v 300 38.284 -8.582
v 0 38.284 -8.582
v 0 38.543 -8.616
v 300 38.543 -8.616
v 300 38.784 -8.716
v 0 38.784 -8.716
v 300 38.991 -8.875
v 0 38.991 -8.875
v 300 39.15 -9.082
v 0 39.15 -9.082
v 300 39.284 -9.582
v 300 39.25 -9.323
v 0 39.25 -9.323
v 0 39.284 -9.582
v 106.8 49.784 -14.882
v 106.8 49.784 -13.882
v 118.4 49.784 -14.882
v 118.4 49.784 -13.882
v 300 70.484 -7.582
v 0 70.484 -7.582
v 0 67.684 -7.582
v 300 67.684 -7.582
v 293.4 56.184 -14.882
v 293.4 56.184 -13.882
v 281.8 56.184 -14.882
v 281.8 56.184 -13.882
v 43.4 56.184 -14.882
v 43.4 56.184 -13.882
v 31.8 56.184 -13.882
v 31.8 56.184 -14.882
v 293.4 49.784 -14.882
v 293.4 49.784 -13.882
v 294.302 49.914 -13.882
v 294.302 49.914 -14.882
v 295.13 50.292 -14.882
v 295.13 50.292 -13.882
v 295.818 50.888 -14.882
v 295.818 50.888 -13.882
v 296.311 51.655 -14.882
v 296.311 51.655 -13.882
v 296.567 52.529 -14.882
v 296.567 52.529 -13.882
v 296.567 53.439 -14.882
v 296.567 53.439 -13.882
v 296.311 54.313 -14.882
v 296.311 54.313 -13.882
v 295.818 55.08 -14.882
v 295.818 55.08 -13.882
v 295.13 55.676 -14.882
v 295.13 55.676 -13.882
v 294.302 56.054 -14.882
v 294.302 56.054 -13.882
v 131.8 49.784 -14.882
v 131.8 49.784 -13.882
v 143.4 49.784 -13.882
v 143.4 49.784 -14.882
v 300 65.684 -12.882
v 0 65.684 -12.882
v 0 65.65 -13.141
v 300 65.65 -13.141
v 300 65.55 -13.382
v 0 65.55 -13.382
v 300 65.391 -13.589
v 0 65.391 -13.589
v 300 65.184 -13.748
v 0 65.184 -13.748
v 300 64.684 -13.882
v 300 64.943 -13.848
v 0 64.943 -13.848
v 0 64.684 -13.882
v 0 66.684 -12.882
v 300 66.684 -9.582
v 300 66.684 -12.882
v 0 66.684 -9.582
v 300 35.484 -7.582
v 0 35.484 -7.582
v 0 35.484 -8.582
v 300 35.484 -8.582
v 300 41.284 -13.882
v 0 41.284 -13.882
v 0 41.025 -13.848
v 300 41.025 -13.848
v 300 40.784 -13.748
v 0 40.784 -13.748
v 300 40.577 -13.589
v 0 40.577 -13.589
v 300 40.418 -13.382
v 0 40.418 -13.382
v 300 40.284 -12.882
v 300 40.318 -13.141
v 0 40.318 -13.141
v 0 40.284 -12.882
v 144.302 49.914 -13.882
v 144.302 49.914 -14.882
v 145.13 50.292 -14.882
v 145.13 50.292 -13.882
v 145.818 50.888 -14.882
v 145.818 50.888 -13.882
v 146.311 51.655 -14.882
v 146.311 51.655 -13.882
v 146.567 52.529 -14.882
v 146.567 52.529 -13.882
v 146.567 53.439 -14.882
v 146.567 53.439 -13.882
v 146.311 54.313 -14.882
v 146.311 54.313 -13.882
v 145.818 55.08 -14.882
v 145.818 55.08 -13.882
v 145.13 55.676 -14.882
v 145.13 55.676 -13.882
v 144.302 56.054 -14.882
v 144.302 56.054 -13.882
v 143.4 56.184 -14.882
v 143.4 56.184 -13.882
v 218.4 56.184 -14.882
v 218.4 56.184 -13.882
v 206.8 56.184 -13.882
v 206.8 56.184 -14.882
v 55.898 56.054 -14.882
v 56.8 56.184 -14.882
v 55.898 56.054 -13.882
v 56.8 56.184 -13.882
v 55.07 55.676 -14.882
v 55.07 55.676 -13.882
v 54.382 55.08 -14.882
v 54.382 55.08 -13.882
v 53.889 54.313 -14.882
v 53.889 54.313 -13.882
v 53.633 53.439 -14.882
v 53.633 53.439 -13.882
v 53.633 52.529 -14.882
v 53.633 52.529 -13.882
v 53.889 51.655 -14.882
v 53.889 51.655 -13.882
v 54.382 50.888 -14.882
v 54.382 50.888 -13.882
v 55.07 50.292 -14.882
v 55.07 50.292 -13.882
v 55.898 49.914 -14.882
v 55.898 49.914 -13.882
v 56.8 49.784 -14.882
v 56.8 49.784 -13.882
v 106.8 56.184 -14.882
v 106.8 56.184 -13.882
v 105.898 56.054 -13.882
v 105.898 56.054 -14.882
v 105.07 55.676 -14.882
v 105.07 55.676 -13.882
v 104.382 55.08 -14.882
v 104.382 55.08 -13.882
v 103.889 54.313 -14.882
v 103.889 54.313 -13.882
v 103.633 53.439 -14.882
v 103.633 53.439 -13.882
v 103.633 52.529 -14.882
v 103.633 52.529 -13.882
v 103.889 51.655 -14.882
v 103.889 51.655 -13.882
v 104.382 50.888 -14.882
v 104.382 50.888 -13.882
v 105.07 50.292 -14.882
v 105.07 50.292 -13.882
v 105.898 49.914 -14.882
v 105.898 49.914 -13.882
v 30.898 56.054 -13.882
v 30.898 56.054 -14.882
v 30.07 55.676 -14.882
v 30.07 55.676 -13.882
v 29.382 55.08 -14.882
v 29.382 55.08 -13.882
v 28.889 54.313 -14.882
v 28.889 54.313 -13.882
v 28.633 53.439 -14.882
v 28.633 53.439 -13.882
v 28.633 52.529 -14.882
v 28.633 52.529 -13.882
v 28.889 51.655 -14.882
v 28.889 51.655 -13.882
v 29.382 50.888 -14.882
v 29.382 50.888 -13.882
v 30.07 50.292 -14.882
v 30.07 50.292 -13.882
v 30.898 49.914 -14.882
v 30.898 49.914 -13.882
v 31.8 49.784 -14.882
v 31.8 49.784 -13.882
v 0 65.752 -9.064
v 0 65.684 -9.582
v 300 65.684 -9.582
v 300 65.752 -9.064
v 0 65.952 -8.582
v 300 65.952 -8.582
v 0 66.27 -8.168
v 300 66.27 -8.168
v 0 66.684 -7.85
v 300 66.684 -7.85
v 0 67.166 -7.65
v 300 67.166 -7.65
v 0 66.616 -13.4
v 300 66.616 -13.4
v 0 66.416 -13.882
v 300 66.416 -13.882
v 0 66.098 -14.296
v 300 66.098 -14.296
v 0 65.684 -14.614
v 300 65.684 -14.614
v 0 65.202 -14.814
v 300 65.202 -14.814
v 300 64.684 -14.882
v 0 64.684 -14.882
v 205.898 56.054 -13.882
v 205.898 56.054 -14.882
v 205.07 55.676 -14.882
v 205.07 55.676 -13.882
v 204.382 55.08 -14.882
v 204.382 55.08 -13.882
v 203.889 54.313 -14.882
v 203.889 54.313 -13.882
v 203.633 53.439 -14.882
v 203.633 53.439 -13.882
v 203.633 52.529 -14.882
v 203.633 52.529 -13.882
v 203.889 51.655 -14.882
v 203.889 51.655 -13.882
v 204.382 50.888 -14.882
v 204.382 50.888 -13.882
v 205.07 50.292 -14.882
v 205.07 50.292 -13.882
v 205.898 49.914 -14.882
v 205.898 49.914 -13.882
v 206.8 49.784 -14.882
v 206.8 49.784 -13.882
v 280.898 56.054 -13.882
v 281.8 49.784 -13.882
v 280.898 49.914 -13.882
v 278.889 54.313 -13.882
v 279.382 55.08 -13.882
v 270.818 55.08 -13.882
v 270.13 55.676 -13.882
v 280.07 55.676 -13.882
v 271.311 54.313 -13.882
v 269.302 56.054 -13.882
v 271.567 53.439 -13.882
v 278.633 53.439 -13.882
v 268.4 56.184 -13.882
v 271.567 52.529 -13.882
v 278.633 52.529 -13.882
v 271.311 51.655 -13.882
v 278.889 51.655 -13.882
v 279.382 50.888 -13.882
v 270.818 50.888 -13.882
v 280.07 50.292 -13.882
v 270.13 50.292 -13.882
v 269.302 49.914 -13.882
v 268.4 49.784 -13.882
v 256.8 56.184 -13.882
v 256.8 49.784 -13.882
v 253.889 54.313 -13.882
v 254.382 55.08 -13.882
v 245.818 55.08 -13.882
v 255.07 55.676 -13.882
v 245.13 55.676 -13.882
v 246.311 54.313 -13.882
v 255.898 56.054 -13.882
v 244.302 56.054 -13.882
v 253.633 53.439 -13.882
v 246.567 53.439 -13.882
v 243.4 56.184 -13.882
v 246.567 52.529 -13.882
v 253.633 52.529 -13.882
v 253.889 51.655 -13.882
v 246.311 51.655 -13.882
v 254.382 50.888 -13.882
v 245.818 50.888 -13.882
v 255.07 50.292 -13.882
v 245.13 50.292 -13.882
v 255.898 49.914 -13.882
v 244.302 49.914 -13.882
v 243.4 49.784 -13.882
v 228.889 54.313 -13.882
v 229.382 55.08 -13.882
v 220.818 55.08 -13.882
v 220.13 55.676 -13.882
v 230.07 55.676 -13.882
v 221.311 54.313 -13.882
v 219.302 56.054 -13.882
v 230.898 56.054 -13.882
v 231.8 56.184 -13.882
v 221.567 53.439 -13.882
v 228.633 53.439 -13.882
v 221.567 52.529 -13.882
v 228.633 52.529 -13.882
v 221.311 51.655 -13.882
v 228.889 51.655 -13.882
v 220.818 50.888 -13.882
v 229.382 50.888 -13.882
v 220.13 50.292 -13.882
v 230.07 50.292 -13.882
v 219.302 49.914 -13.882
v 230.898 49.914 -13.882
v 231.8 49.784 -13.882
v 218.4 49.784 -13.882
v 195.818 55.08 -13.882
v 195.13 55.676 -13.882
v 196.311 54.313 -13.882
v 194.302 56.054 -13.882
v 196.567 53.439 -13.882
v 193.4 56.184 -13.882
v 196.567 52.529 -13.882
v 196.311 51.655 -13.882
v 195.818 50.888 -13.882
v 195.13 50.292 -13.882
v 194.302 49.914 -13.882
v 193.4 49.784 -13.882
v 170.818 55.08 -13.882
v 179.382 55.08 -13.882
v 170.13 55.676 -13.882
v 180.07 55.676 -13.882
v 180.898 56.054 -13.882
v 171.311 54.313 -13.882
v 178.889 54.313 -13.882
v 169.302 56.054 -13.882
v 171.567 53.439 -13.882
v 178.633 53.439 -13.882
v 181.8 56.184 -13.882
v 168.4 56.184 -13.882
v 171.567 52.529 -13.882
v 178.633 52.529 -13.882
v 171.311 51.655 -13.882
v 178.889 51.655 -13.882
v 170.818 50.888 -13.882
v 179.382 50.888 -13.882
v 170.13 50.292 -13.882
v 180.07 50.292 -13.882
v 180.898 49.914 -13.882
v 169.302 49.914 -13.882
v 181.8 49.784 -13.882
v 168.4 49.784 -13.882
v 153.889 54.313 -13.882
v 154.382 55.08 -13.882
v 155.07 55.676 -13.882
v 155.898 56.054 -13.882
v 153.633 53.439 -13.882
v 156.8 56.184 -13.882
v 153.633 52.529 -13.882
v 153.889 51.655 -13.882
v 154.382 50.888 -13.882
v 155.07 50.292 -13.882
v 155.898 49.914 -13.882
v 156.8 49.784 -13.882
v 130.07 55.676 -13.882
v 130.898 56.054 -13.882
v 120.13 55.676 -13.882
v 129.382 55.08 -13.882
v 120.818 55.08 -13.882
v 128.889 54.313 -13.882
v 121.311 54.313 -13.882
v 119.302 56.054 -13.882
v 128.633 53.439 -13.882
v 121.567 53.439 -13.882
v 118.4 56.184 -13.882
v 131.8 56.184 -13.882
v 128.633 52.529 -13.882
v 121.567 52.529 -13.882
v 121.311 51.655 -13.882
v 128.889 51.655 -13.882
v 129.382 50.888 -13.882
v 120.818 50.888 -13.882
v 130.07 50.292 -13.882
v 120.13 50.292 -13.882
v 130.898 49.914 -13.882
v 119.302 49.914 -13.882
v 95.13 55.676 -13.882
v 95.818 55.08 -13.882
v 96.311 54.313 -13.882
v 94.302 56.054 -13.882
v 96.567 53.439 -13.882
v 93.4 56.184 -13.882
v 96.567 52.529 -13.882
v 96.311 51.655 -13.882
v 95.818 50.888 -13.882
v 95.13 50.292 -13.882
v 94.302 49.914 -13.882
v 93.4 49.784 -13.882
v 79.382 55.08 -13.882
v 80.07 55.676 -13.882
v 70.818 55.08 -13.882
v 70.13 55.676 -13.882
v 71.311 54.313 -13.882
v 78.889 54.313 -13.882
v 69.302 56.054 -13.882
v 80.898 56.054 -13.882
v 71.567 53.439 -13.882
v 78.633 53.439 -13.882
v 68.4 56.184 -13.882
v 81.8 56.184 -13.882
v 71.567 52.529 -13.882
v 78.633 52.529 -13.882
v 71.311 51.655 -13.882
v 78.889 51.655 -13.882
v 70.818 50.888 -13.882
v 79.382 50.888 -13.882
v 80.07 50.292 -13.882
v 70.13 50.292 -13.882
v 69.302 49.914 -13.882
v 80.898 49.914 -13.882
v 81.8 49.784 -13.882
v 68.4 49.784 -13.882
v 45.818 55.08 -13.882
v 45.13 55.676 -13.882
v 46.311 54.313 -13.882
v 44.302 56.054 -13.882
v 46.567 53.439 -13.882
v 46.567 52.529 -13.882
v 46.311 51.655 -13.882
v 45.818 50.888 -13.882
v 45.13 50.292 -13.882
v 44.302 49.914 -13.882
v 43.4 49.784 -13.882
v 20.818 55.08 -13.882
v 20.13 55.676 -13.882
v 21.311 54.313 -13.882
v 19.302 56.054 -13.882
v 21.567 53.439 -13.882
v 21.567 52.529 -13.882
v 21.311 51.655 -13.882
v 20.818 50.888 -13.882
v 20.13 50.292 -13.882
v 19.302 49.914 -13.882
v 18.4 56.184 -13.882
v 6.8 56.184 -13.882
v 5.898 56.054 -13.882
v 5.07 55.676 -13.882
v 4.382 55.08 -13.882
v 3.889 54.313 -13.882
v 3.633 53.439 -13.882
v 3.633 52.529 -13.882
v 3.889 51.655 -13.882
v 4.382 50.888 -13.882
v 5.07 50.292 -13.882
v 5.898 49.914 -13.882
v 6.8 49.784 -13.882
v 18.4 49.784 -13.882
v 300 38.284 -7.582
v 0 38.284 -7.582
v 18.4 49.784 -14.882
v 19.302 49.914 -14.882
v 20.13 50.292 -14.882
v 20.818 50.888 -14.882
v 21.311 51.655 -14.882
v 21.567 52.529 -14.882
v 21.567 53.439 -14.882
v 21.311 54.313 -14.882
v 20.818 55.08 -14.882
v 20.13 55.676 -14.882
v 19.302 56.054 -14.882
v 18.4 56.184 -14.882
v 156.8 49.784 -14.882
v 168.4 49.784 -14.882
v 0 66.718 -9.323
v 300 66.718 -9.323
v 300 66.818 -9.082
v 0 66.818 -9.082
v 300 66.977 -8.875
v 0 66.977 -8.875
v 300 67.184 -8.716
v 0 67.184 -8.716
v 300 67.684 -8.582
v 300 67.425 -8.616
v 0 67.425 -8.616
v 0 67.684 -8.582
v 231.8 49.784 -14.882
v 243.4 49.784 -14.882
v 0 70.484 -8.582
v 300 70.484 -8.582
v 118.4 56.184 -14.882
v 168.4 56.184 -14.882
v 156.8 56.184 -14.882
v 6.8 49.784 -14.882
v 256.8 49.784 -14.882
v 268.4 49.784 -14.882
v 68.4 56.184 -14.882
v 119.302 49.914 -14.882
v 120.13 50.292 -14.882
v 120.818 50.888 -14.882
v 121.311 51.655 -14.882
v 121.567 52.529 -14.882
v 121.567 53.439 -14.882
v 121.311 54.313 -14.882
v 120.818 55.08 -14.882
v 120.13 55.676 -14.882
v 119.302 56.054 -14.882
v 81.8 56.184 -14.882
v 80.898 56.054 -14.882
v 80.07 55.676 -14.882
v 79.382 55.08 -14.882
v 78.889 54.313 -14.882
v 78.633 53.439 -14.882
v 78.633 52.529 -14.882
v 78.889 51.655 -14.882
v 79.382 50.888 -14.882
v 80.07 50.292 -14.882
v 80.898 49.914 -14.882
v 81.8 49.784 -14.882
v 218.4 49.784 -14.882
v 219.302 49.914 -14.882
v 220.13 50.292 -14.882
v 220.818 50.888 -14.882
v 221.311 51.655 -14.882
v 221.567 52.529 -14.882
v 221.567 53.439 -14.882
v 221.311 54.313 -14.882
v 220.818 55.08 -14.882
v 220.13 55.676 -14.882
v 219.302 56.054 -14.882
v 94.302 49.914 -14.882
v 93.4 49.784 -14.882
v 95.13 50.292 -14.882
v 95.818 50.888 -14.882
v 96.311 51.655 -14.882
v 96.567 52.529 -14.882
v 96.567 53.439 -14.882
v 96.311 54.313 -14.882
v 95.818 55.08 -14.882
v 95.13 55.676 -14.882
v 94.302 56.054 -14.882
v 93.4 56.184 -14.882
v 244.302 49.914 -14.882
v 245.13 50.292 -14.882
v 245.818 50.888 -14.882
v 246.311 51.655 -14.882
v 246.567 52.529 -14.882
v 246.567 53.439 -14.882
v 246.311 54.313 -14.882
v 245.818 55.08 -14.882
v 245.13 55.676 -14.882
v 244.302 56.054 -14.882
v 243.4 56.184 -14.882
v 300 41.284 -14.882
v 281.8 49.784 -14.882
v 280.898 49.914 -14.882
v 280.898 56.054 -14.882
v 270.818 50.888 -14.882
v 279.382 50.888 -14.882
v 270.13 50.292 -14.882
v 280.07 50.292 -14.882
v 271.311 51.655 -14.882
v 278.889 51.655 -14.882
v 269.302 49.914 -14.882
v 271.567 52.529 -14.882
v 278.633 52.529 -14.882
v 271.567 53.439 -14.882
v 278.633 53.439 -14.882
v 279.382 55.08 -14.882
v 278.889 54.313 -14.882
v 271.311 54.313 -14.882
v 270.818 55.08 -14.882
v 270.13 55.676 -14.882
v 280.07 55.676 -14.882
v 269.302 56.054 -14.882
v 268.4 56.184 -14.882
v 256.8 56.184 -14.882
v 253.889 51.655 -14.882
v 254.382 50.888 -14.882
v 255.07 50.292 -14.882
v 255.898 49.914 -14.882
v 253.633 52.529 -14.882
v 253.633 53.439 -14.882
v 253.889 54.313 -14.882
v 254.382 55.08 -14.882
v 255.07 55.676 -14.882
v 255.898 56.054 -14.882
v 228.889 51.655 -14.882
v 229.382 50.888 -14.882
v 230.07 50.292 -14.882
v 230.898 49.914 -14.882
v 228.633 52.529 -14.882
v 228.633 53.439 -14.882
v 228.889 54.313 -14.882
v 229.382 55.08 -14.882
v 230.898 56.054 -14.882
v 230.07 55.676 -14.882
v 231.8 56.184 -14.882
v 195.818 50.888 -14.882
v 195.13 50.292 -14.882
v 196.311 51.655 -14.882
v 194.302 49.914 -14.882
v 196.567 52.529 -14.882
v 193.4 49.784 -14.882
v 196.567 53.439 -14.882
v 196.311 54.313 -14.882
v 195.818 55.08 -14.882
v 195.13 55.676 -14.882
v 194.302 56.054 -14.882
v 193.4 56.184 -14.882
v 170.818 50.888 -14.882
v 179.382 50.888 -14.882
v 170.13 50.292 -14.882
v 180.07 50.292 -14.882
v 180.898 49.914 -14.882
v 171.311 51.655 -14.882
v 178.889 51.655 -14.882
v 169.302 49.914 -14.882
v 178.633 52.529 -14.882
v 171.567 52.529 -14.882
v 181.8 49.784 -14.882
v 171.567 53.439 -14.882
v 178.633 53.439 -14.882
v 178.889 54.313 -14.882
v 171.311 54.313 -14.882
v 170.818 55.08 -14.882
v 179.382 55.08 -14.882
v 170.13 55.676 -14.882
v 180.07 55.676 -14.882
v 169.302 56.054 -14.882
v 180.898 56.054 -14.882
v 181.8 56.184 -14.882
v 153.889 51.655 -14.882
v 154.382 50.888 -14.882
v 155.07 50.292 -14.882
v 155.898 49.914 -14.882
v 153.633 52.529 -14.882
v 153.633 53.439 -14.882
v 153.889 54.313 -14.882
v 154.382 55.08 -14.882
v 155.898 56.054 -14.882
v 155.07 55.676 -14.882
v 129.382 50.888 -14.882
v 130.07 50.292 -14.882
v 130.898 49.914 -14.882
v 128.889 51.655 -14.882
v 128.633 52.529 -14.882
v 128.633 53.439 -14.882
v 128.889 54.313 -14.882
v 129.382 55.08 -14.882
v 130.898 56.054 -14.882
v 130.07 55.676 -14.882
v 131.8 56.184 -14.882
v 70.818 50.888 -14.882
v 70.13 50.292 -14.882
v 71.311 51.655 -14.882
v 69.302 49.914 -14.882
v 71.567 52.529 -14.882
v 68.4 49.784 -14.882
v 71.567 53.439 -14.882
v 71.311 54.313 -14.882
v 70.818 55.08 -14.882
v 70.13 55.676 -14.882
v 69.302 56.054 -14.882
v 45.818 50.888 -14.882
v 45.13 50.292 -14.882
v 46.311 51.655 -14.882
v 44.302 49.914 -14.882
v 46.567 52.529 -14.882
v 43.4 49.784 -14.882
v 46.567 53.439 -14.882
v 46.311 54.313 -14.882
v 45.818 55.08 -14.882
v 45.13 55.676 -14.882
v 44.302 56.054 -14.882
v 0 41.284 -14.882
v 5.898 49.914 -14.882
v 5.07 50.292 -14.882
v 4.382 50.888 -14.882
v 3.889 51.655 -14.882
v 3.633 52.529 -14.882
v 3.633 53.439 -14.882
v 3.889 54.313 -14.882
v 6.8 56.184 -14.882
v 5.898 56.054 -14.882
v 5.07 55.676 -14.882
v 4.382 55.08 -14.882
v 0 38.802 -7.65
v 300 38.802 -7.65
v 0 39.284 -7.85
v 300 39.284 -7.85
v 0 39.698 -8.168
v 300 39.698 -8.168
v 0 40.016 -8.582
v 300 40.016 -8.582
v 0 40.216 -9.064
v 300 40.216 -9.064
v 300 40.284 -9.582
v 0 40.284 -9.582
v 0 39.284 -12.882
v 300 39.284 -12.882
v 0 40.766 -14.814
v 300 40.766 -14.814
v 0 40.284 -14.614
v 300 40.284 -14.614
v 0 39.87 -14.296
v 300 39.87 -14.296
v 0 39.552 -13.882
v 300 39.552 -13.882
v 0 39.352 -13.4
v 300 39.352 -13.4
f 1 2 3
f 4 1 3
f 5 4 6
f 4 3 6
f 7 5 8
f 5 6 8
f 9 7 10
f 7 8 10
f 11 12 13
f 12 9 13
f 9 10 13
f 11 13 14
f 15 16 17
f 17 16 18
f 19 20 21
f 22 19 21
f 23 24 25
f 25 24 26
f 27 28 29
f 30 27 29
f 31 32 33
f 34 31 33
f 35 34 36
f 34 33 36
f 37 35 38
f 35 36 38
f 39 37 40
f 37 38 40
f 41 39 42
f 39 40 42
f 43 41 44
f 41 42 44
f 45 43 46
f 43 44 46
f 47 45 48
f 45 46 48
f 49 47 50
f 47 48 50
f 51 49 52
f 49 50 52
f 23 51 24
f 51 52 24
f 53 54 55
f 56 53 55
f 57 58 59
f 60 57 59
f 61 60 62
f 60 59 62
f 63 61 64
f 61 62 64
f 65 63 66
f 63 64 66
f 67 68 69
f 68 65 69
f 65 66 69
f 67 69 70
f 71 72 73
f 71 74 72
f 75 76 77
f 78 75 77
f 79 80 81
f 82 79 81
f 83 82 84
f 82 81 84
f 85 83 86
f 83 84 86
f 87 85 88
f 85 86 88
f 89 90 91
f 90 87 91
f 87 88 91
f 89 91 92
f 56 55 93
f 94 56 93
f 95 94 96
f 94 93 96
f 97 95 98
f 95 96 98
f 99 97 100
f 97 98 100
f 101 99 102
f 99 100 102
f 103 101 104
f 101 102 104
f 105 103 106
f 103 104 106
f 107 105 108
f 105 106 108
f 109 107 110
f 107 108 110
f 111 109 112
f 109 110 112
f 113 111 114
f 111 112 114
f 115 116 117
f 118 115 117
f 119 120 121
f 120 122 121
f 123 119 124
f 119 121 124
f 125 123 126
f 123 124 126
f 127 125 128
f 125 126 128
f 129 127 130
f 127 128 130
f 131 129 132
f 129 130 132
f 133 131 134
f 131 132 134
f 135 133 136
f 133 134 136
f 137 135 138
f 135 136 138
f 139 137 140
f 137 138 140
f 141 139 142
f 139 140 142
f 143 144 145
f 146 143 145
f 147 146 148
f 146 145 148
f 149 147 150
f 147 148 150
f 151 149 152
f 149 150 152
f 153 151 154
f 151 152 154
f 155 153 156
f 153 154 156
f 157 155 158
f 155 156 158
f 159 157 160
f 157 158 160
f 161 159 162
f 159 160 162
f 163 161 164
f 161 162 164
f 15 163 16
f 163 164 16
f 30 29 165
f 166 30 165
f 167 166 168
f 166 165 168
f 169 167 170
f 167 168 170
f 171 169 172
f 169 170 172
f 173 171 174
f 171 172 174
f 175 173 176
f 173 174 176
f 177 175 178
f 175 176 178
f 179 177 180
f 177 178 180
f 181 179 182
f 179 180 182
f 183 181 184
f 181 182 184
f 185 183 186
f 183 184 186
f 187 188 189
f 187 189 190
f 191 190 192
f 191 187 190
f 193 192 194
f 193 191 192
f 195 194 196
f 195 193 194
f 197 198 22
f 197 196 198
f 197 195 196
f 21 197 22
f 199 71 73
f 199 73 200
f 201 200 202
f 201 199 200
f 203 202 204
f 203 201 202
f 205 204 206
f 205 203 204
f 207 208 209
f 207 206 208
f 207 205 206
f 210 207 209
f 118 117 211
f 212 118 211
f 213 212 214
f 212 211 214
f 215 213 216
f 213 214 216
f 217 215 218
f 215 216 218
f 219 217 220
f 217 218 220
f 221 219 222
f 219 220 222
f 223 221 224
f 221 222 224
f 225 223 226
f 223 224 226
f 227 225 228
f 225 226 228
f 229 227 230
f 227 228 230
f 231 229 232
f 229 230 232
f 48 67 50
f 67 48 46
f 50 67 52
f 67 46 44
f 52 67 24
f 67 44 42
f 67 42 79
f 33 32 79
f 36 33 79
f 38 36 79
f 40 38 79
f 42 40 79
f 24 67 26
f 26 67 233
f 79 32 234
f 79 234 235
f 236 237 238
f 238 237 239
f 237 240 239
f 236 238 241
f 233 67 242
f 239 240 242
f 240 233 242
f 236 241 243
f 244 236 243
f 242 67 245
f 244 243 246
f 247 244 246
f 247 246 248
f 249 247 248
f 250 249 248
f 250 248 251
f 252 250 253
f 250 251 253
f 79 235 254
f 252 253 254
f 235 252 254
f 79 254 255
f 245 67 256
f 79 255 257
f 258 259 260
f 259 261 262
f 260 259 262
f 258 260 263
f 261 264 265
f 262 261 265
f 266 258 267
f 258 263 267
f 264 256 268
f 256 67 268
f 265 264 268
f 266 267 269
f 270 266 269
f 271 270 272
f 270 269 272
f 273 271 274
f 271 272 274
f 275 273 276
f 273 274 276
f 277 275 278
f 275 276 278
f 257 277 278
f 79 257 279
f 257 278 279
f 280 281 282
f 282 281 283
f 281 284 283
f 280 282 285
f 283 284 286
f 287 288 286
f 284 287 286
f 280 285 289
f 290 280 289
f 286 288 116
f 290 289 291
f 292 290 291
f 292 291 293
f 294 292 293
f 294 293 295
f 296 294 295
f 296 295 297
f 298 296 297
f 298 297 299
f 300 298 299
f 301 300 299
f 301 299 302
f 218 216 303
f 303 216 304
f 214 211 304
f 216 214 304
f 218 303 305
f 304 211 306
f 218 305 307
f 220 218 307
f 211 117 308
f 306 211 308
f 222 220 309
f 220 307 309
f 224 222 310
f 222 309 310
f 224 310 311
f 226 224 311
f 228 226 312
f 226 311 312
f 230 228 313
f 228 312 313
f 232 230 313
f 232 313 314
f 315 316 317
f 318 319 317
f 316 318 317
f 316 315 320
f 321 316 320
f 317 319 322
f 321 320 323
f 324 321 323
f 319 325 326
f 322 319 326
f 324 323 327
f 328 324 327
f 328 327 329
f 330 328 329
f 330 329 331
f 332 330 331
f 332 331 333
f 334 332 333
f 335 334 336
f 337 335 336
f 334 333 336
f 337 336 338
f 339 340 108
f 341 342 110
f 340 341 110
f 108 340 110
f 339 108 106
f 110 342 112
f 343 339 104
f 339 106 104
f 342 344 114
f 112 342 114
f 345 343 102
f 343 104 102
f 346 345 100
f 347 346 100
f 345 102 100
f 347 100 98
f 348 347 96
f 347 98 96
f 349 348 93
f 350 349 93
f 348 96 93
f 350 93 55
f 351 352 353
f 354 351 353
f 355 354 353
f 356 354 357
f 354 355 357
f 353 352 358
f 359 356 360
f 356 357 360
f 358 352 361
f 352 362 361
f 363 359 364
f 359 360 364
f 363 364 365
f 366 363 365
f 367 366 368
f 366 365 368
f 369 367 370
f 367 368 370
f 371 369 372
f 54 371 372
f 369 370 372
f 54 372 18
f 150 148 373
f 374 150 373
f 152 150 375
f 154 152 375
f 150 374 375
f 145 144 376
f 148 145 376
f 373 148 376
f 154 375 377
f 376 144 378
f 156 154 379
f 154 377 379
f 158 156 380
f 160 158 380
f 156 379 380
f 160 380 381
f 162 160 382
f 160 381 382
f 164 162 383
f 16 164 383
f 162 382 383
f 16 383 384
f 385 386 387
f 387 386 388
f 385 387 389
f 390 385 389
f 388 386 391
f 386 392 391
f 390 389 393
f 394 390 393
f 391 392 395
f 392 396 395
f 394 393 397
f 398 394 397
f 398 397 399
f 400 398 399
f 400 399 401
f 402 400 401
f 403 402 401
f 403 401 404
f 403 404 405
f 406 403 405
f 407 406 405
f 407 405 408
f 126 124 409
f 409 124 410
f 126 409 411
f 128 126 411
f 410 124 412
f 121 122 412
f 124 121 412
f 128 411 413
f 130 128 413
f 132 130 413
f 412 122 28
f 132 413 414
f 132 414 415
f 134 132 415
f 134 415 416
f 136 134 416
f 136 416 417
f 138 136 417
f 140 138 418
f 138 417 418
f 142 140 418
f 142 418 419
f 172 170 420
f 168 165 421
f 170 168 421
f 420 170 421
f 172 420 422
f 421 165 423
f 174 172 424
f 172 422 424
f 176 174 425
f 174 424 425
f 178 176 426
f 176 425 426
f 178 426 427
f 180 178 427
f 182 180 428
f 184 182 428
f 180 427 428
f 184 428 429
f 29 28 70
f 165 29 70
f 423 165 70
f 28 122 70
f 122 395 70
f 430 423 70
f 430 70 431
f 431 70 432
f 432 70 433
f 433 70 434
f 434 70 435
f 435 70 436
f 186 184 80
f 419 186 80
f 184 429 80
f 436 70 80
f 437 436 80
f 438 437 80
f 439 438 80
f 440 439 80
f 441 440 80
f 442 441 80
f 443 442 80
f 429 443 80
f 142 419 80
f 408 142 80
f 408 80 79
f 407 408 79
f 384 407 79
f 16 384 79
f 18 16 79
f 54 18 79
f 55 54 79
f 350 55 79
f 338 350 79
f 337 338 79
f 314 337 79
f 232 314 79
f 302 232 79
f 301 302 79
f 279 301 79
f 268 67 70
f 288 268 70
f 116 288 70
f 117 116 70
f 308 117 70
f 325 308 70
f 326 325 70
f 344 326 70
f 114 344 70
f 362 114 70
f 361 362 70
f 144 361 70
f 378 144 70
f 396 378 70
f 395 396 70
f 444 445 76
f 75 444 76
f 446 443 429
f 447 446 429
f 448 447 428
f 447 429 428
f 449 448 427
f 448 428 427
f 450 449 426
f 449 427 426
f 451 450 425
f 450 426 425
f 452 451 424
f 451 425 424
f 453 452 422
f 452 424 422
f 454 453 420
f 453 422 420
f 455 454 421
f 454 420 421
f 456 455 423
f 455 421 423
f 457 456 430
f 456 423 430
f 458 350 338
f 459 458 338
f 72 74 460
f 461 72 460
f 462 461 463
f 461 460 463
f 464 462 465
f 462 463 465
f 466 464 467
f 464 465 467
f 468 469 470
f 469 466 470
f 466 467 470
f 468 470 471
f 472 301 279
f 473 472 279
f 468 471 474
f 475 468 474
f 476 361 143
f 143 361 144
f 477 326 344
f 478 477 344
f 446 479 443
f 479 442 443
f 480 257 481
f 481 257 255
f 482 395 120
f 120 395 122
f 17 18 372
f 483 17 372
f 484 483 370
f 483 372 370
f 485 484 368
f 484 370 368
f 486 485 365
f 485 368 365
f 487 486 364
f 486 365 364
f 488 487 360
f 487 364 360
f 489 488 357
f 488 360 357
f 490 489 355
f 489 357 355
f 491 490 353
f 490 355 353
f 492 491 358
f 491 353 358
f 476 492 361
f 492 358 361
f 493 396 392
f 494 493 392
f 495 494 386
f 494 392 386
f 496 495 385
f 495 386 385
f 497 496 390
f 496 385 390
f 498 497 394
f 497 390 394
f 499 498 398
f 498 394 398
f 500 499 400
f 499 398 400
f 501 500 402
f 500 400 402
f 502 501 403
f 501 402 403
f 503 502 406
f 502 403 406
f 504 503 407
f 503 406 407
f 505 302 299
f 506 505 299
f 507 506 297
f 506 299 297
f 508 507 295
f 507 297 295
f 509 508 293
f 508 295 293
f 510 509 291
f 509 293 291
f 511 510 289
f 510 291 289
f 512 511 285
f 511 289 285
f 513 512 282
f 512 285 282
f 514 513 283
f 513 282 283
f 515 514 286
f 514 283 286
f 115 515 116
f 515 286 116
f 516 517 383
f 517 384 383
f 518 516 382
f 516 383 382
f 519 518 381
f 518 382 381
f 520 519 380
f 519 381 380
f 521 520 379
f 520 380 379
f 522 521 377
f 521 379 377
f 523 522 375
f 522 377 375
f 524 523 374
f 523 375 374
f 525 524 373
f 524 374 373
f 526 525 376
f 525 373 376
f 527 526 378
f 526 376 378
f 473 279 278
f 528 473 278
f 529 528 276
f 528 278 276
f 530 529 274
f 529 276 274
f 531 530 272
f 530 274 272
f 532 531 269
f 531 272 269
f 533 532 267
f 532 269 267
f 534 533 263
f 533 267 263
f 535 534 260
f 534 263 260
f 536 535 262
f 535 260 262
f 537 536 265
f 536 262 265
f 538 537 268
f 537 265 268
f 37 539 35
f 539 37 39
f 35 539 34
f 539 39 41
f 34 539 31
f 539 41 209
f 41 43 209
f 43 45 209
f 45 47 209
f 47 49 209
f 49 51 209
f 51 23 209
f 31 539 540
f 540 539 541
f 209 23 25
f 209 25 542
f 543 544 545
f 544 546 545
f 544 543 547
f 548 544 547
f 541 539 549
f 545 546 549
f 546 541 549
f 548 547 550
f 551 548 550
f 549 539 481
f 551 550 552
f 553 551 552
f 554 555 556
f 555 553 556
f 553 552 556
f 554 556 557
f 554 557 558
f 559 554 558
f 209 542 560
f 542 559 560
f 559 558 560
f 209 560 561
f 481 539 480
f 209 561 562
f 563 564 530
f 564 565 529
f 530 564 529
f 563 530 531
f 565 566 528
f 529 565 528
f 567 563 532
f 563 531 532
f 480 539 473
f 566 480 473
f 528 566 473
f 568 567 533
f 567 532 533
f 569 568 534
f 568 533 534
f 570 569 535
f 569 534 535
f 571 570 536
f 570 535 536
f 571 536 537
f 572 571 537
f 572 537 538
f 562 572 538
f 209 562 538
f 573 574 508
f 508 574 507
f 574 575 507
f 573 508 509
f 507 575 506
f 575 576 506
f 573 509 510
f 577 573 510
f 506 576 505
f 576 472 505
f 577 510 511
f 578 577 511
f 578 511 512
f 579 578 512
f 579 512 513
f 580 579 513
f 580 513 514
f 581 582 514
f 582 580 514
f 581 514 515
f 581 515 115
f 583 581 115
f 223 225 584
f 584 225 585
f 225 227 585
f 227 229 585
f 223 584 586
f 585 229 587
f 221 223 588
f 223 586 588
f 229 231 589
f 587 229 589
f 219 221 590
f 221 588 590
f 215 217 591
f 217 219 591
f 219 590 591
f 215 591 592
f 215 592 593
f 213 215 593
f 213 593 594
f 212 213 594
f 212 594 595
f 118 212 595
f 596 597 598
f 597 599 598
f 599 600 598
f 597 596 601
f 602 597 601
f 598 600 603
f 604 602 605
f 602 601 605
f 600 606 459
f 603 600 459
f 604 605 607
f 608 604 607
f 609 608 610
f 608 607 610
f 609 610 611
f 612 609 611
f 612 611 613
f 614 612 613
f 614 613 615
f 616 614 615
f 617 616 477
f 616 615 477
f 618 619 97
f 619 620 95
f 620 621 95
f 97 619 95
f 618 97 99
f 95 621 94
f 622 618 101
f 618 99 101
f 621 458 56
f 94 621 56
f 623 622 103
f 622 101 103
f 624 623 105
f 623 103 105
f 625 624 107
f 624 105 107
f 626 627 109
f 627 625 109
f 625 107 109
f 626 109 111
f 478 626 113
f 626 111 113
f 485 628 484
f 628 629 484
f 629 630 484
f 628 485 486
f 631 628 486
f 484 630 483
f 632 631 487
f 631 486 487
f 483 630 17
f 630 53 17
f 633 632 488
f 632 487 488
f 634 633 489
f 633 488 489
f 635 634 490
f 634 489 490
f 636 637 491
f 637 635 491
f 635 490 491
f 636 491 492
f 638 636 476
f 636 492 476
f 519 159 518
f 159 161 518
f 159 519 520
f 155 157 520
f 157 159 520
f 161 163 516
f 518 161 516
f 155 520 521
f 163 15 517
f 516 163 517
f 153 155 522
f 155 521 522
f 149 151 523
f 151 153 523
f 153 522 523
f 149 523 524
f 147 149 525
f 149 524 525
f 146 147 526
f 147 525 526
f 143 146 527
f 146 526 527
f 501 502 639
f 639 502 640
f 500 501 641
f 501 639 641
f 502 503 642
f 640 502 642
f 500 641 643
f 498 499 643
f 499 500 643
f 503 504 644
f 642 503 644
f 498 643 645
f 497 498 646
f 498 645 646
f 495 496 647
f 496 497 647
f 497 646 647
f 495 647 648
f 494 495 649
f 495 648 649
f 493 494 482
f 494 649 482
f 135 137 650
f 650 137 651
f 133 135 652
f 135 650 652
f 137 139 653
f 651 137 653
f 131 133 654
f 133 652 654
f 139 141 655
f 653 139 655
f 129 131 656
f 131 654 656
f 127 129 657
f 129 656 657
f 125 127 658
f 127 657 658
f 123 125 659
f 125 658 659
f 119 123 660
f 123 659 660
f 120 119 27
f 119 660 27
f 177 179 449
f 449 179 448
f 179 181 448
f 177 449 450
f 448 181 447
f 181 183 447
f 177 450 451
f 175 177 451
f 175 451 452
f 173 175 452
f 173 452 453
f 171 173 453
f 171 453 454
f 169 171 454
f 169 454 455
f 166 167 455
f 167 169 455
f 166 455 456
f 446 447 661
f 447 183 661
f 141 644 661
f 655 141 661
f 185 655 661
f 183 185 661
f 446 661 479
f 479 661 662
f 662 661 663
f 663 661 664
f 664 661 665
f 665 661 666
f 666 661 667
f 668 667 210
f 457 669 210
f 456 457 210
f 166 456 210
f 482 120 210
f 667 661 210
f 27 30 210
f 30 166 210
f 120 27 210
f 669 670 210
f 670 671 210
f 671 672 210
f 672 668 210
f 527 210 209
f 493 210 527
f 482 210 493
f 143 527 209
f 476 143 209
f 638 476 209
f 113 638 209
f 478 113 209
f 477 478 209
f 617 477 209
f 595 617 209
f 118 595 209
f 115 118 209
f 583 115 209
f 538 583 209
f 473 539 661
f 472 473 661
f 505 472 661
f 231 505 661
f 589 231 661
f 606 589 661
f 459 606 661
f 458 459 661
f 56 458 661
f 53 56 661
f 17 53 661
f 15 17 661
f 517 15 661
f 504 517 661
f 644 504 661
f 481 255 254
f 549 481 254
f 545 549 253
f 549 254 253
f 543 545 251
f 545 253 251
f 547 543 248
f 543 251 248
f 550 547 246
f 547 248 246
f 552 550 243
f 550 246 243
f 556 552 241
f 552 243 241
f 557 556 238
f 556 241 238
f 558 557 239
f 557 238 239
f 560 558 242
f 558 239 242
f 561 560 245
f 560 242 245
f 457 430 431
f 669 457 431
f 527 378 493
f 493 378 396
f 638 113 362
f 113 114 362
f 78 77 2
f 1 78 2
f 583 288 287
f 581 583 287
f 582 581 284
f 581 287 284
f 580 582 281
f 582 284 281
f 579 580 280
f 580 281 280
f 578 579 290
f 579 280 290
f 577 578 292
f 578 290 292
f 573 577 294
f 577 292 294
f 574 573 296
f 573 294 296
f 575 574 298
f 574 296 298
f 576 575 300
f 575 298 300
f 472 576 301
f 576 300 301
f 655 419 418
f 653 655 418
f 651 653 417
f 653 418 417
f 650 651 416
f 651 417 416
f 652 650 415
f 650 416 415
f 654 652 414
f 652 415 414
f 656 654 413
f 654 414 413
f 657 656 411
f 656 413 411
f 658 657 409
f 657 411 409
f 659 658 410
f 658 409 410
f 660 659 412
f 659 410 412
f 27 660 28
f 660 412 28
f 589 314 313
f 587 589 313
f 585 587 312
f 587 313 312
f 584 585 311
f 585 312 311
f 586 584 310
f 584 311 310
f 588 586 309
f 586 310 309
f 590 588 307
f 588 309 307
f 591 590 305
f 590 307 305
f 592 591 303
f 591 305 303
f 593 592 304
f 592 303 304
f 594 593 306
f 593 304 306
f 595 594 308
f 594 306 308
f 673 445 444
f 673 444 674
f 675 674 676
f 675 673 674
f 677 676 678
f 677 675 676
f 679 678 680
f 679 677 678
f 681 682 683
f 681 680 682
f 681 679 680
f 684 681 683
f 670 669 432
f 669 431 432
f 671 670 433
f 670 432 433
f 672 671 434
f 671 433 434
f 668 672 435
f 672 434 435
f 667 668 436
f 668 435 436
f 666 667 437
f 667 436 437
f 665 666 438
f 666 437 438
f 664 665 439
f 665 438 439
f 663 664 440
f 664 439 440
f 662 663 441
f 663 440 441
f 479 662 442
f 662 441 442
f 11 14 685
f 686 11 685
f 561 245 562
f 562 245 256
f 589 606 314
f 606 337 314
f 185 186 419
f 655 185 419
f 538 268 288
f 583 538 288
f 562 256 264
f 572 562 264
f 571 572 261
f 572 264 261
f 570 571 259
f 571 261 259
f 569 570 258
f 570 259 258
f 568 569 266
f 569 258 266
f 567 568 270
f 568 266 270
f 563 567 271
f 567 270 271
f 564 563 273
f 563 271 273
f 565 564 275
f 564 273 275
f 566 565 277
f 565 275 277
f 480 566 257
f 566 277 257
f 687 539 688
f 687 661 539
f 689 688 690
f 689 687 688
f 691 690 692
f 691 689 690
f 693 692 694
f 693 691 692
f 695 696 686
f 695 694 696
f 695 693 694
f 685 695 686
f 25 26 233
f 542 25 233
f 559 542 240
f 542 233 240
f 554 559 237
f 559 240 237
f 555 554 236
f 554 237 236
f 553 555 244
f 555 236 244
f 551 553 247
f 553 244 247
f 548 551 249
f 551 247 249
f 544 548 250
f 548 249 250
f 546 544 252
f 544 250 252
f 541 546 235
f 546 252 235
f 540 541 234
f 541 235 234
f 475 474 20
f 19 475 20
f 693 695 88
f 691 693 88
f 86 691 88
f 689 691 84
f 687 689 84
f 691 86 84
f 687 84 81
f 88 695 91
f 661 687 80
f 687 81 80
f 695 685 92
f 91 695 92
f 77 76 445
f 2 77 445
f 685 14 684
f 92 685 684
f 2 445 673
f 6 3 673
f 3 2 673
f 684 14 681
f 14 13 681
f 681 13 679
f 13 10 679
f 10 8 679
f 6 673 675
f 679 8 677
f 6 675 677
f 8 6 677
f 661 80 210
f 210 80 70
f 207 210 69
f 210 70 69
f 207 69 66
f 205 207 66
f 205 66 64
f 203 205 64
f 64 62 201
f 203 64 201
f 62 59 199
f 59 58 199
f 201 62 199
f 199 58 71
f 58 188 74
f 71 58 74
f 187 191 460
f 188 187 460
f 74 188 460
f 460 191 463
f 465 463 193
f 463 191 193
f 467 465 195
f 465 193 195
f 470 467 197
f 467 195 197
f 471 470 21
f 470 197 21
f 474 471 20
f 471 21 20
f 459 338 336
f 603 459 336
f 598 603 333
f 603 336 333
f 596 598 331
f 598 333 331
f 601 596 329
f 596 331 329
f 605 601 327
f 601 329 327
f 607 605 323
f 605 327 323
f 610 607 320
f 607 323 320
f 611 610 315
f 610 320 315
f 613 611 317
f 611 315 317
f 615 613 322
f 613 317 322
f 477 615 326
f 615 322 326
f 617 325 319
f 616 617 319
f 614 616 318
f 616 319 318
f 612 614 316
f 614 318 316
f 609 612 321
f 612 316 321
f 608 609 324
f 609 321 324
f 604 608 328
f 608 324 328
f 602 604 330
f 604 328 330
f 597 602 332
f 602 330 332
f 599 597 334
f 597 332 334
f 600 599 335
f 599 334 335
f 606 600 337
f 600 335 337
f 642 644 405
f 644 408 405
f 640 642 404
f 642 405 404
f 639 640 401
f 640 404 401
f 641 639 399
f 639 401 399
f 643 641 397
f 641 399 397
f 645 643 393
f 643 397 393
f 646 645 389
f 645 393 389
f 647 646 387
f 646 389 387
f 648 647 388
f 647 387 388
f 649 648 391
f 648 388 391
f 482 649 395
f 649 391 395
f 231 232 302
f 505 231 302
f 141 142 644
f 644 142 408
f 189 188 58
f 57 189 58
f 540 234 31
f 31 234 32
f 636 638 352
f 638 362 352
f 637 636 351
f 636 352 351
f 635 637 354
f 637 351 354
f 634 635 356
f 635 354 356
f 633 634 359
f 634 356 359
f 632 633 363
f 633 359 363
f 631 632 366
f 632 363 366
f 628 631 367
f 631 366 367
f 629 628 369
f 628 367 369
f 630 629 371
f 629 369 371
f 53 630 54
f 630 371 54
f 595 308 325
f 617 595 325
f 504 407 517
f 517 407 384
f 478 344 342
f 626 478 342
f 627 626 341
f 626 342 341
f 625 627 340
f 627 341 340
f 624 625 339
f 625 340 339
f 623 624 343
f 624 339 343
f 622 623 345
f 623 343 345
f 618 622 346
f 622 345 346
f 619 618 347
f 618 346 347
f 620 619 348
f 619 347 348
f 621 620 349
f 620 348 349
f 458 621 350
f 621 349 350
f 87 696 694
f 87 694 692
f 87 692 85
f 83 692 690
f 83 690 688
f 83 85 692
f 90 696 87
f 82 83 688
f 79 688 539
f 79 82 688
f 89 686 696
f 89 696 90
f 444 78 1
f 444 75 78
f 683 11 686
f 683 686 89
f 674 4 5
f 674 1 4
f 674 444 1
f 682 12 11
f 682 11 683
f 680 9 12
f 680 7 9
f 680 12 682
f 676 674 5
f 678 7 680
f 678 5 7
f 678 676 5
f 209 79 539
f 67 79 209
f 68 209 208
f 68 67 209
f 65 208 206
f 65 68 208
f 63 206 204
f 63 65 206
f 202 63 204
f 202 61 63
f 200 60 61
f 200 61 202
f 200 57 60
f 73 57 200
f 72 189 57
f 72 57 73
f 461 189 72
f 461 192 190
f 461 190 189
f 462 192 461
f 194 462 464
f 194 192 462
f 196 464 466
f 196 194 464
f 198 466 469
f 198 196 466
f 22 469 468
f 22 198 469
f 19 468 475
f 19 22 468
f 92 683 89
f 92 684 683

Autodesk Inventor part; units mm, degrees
ref_plane "YZ Plane" through (0, 0, 0) normal (1, 0, 0) x (0, 1, 0)
ref_plane "XZ Plane" through (0, 0, 0) normal (0, 1, 0) x (-1, 0, 0)
ref_plane "XY Plane" through (0, 0, 0) normal (0, 0, 1) x (1, 0, 0)
sketch "Sketch1" plane through (0, 0, 0) normal (1, 0, 0) x (0, 1, 0)
  line L0 (41.284, -14.8819) -> (64.684, -14.8819)
  line L1 (64.684, -13.8819) -> (41.284, -13.8819)
  line L2 (67.684, -8.5819) -> (70.484, -8.5819)
  line L3 (70.484, -8.5819) -> (70.484, -7.5819)
  line L4 (70.484, -7.5819) -> (67.684, -7.5819)
  line L5 (-1817770.1114, -20.3632) -> (-1817770.1114, -8.5819)
  line L6 (38.284, -7.5819) -> (35.484, -7.5819)
  line L7 (35.484, -7.5819) -> (35.484, -8.5819)
  line L8 (35.484, -8.5819) -> (38.284, -8.5819)
  line L9 (40.284, -9.5819) -> (40.284, -12.8819)
  arc A0 (67.684, -8.5819) -> (66.684, -9.5819) centre (67.684, -9.5819) ccw
  arc A1 (64.684, -13.8819) -> (65.684, -12.8819) centre (64.684, -12.8819) ccw
  arc A2 (40.284, -12.8819) -> (41.284, -13.8819) centre (41.284, -12.8819) ccw
  arc A3 (39.284, -9.5819) -> (38.284, -8.5819) centre (38.284, -9.5819) ccw
  arc A4 (40.284, -9.5819) -> (38.284, -7.5819) centre (38.284, -9.5819) ccw
  arc A5 (39.284, -12.8819) -> (41.284, -14.8819) centre (41.284, -12.8819) ccw
  line L10 (39.284, -9.5819) -> (39.284, -12.8819)
  arc A6 (67.684, -7.5819) -> (65.684, -9.5819) centre (67.684, -9.5819) ccw
  arc A7 (64.684, -14.8819) -> (66.684, -12.8819) centre (64.684, -12.8819) ccw
  line L11 (66.684, -9.5819) -> (66.684, -12.8819)
  line L12 (65.684, -9.5819) -> (65.684, -12.8819)
  line L13 (52.984, -4.8951) -> (52.984, -40.6352) construction
  line L14 (-285.558, -25.9225) -> (179.442, -25.9225) projected
  line L15 (179.442, -25.9225) -> (179.442, -22.9225) projected
  line L16 (-285.558, -22.9225) -> (179.442, -22.9225) projected
  line L17 (-285.558, -25.9225) -> (-285.558, -22.9225) projected
  point P0 (0, 0)
  point P1 (40.284, -11.2319)
  dimension "d0" = 1
  dimension "d1" = 1
  dimension "d5" = 35
  dimension "d8" = 7.3
  dimension "d9" = 1
  dimension "d10" = 1
  dimension "d11" = 2
  dimension "d12" = 2
  dimension "d13" = 12.7
  dimension "d15" = 12.7
  dimension "d16" = 4.8
  dimension "d17" = 4.8
  dimension "d20" = 1
  dimension "d21" = 1
  dimension "d22" = 2
extrude "Extrusion1" add sketch "Sketch1" along normal blind 300 contours A5 L10 A3 L8 L7 L6 A4 L9 A2 L1 A1 L12 A6 L4 L3 L2 A0 L11 A7 L0
sketch "Sketch2" plane through (0, 41.284, -13.8819) normal (0, 0, 1) x (1, 0, 0)
  line L0 (3.6, 11.7) -> (21.6, 11.7) construction
  line L1 (6.8, 8.5) -> (18.4, 8.5)
  line L2 (18.4, 14.9) -> (6.8, 14.9)
  arc A0 (6.8, 14.9) -> (6.8, 8.5) centre (6.8, 11.7) ccw
  arc A1 (18.4, 8.5) -> (18.4, 14.9) centre (18.4, 11.7) ccw
  line L3 (0, 29.2) -> (300, 29.2) projected
  line L4 (0, -5.8) -> (300, -5.8) projected
  line L5 (0, 23.4) -> (0, 0) projected
  arc A2 (31.8, 14.9) -> (31.8, 8.5) centre (31.8, 11.7) ccw
  line L6 (31.8, 8.5) -> (43.4, 8.5)
  arc A3 (43.4, 8.5) -> (43.4, 14.9) centre (43.4, 11.7) ccw
  line L7 (43.4, 14.9) -> (31.8, 14.9)
  arc A4 (56.8, 14.9) -> (56.8, 8.5) centre (56.8, 11.7) ccw
  line L8 (56.8, 8.5) -> (68.4, 8.5)
  arc A5 (68.4, 8.5) -> (68.4, 14.9) centre (68.4, 11.7) ccw
  line L9 (68.4, 14.9) -> (56.8, 14.9)
  arc A6 (81.8, 14.9) -> (81.8, 8.5) centre (81.8, 11.7) ccw
  line L10 (81.8, 8.5) -> (93.4, 8.5)
  arc A7 (93.4, 8.5) -> (93.4, 14.9) centre (93.4, 11.7) ccw
  line L11 (93.4, 14.9) -> (81.8, 14.9)
  arc A8 (106.8, 14.9) -> (106.8, 8.5) centre (106.8, 11.7) ccw
  line L12 (106.8, 8.5) -> (118.4, 8.5)
  arc A9 (118.4, 8.5) -> (118.4, 14.9) centre (118.4, 11.7) ccw
  line L13 (118.4, 14.9) -> (106.8, 14.9)
  arc A10 (131.8, 14.9) -> (131.8, 8.5) centre (131.8, 11.7) ccw
  line L14 (131.8, 8.5) -> (143.4, 8.5)
  arc A11 (143.4, 8.5) -> (143.4, 14.9) centre (143.4, 11.7) ccw
  line L15 (143.4, 14.9) -> (131.8, 14.9)
  arc A12 (156.8, 14.9) -> (156.8, 8.5) centre (156.8, 11.7) ccw
  line L16 (156.8, 8.5) -> (168.4, 8.5)
  arc A13 (168.4, 8.5) -> (168.4, 14.9) centre (168.4, 11.7) ccw
  line L17 (168.4, 14.9) -> (156.8, 14.9)
  arc A14 (181.8, 14.9) -> (181.8, 8.5) centre (181.8, 11.7) ccw
  line L18 (181.8, 8.5) -> (193.4, 8.5)
  arc A15 (193.4, 8.5) -> (193.4, 14.9) centre (193.4, 11.7) ccw
  line L19 (193.4, 14.9) -> (181.8, 14.9)
  line L20 (0, 0) -> (300, 0) projected
  line L21 (0, 24.4) -> (300, 24.4) projected
  line L22 (0, -1) -> (300, -1) projected
  arc A16 (206.8, 14.9) -> (206.8, 8.5) centre (206.8, 11.7) ccw
  line L23 (218.4, 14.9) -> (206.8, 14.9)
  arc A17 (218.4, 8.5) -> (218.4, 14.9) centre (218.4, 11.7) ccw
  line L24 (206.8, 8.5) -> (218.4, 8.5)
  arc A18 (231.8, 14.9) -> (231.8, 8.5) centre (231.8, 11.7) ccw
  line L25 (243.4, 14.9) -> (231.8, 14.9)
  arc A19 (243.4, 8.5) -> (243.4, 14.9) centre (243.4, 11.7) ccw
  line L26 (231.8, 8.5) -> (243.4, 8.5)
  arc A20 (256.8, 14.9) -> (256.8, 8.5) centre (256.8, 11.7) ccw
  line L27 (268.4, 14.9) -> (256.8, 14.9)
  arc A21 (268.4, 8.5) -> (268.4, 14.9) centre (268.4, 11.7) ccw
  line L28 (256.8, 8.5) -> (268.4, 8.5)
  arc A22 (281.8, 14.9) -> (281.8, 8.5) centre (281.8, 11.7) ccw
  line L29 (293.4, 14.9) -> (281.8, 14.9)
  arc A23 (293.4, 8.5) -> (293.4, 14.9) centre (293.4, 11.7) ccw
  line L30 (281.8, 8.5) -> (293.4, 8.5)
  point P0 (0, -41.284)
  point P1 (12.6, 11.7)
  point P2 (28.6, 11.7)
  point P3 (46.6, 11.7)
  point P4 (53.6, 11.7)
  point P5 (71.6, 11.7)
  point P6 (78.6, 11.7)
  point P7 (96.6, 11.7)
  point P8 (103.6, 11.7)
  point P9 (121.6, 11.7)
  point P10 (128.6, 11.7)
  point P11 (146.6, 11.7)
  point P12 (153.6, 11.7)
  point P13 (171.6, 11.7)
  point P14 (178.6, 11.7)
  point P15 (196.6, 11.7)
  point P16 (28.6, 11.7)
  point P17 (203.6, 11.7)
  point P18 (221.6, 11.7)
  point P19 (228.6, 11.7)
  point P20 (246.6, 11.7)
  point P21 (253.6, 11.7)
  point P22 (271.6, 11.7)
  point P23 (278.6, 11.7)
  point P24 (296.6, 11.7)
  dimension "d26" = 18
  dimension "d33" = 25
  dimension "d46" = 3.6
  dimension "d47" = 17.5
  dimension "d48" = 17.5
  dimension "d51" = 25
extrude "Extrusion2" cut sketch "Sketch2" against normal blind 25
sketch "Sketch3" plane through (0, 41.284, -13.8819) normal (0, 0, 1) x (1, 0, 0)
  line L0 (110, 34.2) -> (302, 34.2)
  line L1 (302, 34.2) -> (302, -10.8)
  line L2 (302, -10.8) -> (110, -10.8)
  line L3 (110, -10.8) -> (110, 34.2)
  line L4 (0, 23.4) -> (0, 0) projected
  line L5 (300, 23.4) -> (300, 0) projected
  line L6 (0, -5.8) -> (300, -5.8) projected
  line L7 (0, 29.2) -> (300, 29.2) projected
  point P0 (0, -41.284)
  dimension "d56" = 110
  dimension "d57" = 2
  dimension "d58" = 5
  dimension "d59" = 5
equation "\"d39\" = d33"
properties part number "DIN-rail"
